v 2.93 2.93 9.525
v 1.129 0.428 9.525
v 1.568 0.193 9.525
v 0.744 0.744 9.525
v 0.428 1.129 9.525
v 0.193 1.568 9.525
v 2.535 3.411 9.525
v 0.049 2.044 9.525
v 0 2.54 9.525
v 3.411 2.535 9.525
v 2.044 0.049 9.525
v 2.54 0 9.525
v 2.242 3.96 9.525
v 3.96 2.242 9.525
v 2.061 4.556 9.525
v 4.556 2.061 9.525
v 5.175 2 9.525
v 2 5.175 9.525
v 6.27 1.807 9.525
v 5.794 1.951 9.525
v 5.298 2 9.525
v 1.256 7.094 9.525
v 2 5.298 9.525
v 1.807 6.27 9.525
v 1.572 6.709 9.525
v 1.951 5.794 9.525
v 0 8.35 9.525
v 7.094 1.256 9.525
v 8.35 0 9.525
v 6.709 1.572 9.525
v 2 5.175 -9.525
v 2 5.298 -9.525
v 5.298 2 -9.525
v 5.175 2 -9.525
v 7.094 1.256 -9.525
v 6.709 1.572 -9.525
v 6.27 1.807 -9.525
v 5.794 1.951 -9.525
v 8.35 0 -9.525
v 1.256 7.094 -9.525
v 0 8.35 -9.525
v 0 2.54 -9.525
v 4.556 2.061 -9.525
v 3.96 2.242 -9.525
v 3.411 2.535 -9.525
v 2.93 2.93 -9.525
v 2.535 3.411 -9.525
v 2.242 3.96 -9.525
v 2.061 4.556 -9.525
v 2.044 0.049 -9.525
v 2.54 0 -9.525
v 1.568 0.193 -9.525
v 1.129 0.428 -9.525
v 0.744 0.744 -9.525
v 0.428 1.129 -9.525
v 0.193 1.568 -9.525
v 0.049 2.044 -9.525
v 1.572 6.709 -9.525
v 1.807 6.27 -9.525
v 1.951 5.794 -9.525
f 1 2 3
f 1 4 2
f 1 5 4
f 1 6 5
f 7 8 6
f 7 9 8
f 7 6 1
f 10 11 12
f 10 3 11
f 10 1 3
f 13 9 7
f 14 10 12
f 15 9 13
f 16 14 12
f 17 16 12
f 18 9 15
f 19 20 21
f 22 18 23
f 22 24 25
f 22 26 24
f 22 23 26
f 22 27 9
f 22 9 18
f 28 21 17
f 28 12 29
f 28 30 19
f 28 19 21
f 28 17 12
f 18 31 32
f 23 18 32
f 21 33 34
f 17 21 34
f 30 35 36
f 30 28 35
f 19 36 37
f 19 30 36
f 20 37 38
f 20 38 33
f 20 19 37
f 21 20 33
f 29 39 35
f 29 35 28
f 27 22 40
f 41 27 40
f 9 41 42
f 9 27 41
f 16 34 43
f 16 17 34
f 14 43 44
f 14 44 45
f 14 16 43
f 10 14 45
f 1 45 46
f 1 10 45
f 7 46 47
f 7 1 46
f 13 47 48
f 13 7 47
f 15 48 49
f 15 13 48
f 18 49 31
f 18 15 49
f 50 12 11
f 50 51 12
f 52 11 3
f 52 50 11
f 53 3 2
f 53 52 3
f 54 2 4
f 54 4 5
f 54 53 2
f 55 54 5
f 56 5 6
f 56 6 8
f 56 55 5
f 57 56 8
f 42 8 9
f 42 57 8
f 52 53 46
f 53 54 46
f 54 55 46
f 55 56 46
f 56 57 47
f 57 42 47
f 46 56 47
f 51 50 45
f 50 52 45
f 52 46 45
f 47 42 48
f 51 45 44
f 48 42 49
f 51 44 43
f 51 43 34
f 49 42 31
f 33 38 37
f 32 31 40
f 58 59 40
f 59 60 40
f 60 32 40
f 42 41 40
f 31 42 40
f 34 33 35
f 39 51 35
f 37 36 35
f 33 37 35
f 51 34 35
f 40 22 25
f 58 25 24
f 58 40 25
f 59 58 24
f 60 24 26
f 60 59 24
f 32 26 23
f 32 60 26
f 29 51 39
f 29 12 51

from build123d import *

# Parameters (mm, degrees)
BOSS_EXTRUDE1_DEPTH = 9.525
CHAMFER1_SIZE       = 2
FILLET1_R           = 2.54
FILLET2_R           = 2.54
FILLET3_R           = 3.175


with BuildPart() as part:
    # Sketch1 → Boss-Extrude1 (new, symmetric)
    with BuildSketch(Plane.XY):
        Polygon((0, 0), (8.35, 0), (8.35, 2), (2, 2), (2, 8.35), (0, 8.35), align=None)
    extrude(amount=BOSS_EXTRUDE1_DEPTH, both=True)

    # Chamfer1
    chamfer1_edges = [part.edges().sort_by_distance(p)[0] for p in [
        (8.35, 2, 0),
        (2, 8.35, 0),
    ]]
    chamfer(chamfer1_edges, length=CHAMFER1_SIZE - 0.0001)  # a hair under: the kernel refuses the full size

    # Fillet1
    fillet1_edges = [part.edges().sort_by_distance(p)[0] for p in [
        (6.3501, 2, 0),
        (2, 6.3501, 0),
    ]]
    fillet(fillet1_edges, radius=FILLET1_R)

    # Fillet2
    fillet2_edges = [part.edges().sort_by_distance(p)[0] for p in [
        (0, 0, 0),
    ]]
    fillet(fillet2_edges, radius=FILLET2_R)

    # Fillet3
    fillet3_edges = [part.edges().sort_by_distance(p)[0] for p in [
        (2, 2, 0),
    ]]
    fillet(fillet3_edges, radius=FILLET3_R)


solid = part.part
